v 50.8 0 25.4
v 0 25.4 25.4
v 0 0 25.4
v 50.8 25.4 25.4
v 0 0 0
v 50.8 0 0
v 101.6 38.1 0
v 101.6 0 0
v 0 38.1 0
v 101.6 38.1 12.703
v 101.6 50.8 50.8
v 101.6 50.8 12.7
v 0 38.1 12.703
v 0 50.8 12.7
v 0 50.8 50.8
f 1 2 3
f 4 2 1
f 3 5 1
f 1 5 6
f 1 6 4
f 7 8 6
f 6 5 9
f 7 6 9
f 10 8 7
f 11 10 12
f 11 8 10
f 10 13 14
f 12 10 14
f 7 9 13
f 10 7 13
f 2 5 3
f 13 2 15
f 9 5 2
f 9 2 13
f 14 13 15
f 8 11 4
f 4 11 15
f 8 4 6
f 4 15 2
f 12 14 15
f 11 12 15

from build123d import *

# Parameters (mm, degrees)
F1_DEPTH = 101.6
F2_W     = 50.8
F2_H     = 25.4
F3_DEPTH = 25.4


with BuildPart() as f1:
    # F0 (on Right) → F1 (new body)
    with BuildSketch(Plane.YZ):
        Polygon((50.8000037106, 12.7), (50.8000037106, 50.8), (0, 0), (38.1, 0), (38.1, 12.7030098811), align=None)
    extrude(amount=F1_DEPTH)

    # F2 (on Top) → F3 (join)
    with BuildSketch(Plane.XY):
        with Locations((25.4, 12.7)):
            Rectangle(F2_W, F2_H)
    extrude(amount=F3_DEPTH)


solid = f1.part
